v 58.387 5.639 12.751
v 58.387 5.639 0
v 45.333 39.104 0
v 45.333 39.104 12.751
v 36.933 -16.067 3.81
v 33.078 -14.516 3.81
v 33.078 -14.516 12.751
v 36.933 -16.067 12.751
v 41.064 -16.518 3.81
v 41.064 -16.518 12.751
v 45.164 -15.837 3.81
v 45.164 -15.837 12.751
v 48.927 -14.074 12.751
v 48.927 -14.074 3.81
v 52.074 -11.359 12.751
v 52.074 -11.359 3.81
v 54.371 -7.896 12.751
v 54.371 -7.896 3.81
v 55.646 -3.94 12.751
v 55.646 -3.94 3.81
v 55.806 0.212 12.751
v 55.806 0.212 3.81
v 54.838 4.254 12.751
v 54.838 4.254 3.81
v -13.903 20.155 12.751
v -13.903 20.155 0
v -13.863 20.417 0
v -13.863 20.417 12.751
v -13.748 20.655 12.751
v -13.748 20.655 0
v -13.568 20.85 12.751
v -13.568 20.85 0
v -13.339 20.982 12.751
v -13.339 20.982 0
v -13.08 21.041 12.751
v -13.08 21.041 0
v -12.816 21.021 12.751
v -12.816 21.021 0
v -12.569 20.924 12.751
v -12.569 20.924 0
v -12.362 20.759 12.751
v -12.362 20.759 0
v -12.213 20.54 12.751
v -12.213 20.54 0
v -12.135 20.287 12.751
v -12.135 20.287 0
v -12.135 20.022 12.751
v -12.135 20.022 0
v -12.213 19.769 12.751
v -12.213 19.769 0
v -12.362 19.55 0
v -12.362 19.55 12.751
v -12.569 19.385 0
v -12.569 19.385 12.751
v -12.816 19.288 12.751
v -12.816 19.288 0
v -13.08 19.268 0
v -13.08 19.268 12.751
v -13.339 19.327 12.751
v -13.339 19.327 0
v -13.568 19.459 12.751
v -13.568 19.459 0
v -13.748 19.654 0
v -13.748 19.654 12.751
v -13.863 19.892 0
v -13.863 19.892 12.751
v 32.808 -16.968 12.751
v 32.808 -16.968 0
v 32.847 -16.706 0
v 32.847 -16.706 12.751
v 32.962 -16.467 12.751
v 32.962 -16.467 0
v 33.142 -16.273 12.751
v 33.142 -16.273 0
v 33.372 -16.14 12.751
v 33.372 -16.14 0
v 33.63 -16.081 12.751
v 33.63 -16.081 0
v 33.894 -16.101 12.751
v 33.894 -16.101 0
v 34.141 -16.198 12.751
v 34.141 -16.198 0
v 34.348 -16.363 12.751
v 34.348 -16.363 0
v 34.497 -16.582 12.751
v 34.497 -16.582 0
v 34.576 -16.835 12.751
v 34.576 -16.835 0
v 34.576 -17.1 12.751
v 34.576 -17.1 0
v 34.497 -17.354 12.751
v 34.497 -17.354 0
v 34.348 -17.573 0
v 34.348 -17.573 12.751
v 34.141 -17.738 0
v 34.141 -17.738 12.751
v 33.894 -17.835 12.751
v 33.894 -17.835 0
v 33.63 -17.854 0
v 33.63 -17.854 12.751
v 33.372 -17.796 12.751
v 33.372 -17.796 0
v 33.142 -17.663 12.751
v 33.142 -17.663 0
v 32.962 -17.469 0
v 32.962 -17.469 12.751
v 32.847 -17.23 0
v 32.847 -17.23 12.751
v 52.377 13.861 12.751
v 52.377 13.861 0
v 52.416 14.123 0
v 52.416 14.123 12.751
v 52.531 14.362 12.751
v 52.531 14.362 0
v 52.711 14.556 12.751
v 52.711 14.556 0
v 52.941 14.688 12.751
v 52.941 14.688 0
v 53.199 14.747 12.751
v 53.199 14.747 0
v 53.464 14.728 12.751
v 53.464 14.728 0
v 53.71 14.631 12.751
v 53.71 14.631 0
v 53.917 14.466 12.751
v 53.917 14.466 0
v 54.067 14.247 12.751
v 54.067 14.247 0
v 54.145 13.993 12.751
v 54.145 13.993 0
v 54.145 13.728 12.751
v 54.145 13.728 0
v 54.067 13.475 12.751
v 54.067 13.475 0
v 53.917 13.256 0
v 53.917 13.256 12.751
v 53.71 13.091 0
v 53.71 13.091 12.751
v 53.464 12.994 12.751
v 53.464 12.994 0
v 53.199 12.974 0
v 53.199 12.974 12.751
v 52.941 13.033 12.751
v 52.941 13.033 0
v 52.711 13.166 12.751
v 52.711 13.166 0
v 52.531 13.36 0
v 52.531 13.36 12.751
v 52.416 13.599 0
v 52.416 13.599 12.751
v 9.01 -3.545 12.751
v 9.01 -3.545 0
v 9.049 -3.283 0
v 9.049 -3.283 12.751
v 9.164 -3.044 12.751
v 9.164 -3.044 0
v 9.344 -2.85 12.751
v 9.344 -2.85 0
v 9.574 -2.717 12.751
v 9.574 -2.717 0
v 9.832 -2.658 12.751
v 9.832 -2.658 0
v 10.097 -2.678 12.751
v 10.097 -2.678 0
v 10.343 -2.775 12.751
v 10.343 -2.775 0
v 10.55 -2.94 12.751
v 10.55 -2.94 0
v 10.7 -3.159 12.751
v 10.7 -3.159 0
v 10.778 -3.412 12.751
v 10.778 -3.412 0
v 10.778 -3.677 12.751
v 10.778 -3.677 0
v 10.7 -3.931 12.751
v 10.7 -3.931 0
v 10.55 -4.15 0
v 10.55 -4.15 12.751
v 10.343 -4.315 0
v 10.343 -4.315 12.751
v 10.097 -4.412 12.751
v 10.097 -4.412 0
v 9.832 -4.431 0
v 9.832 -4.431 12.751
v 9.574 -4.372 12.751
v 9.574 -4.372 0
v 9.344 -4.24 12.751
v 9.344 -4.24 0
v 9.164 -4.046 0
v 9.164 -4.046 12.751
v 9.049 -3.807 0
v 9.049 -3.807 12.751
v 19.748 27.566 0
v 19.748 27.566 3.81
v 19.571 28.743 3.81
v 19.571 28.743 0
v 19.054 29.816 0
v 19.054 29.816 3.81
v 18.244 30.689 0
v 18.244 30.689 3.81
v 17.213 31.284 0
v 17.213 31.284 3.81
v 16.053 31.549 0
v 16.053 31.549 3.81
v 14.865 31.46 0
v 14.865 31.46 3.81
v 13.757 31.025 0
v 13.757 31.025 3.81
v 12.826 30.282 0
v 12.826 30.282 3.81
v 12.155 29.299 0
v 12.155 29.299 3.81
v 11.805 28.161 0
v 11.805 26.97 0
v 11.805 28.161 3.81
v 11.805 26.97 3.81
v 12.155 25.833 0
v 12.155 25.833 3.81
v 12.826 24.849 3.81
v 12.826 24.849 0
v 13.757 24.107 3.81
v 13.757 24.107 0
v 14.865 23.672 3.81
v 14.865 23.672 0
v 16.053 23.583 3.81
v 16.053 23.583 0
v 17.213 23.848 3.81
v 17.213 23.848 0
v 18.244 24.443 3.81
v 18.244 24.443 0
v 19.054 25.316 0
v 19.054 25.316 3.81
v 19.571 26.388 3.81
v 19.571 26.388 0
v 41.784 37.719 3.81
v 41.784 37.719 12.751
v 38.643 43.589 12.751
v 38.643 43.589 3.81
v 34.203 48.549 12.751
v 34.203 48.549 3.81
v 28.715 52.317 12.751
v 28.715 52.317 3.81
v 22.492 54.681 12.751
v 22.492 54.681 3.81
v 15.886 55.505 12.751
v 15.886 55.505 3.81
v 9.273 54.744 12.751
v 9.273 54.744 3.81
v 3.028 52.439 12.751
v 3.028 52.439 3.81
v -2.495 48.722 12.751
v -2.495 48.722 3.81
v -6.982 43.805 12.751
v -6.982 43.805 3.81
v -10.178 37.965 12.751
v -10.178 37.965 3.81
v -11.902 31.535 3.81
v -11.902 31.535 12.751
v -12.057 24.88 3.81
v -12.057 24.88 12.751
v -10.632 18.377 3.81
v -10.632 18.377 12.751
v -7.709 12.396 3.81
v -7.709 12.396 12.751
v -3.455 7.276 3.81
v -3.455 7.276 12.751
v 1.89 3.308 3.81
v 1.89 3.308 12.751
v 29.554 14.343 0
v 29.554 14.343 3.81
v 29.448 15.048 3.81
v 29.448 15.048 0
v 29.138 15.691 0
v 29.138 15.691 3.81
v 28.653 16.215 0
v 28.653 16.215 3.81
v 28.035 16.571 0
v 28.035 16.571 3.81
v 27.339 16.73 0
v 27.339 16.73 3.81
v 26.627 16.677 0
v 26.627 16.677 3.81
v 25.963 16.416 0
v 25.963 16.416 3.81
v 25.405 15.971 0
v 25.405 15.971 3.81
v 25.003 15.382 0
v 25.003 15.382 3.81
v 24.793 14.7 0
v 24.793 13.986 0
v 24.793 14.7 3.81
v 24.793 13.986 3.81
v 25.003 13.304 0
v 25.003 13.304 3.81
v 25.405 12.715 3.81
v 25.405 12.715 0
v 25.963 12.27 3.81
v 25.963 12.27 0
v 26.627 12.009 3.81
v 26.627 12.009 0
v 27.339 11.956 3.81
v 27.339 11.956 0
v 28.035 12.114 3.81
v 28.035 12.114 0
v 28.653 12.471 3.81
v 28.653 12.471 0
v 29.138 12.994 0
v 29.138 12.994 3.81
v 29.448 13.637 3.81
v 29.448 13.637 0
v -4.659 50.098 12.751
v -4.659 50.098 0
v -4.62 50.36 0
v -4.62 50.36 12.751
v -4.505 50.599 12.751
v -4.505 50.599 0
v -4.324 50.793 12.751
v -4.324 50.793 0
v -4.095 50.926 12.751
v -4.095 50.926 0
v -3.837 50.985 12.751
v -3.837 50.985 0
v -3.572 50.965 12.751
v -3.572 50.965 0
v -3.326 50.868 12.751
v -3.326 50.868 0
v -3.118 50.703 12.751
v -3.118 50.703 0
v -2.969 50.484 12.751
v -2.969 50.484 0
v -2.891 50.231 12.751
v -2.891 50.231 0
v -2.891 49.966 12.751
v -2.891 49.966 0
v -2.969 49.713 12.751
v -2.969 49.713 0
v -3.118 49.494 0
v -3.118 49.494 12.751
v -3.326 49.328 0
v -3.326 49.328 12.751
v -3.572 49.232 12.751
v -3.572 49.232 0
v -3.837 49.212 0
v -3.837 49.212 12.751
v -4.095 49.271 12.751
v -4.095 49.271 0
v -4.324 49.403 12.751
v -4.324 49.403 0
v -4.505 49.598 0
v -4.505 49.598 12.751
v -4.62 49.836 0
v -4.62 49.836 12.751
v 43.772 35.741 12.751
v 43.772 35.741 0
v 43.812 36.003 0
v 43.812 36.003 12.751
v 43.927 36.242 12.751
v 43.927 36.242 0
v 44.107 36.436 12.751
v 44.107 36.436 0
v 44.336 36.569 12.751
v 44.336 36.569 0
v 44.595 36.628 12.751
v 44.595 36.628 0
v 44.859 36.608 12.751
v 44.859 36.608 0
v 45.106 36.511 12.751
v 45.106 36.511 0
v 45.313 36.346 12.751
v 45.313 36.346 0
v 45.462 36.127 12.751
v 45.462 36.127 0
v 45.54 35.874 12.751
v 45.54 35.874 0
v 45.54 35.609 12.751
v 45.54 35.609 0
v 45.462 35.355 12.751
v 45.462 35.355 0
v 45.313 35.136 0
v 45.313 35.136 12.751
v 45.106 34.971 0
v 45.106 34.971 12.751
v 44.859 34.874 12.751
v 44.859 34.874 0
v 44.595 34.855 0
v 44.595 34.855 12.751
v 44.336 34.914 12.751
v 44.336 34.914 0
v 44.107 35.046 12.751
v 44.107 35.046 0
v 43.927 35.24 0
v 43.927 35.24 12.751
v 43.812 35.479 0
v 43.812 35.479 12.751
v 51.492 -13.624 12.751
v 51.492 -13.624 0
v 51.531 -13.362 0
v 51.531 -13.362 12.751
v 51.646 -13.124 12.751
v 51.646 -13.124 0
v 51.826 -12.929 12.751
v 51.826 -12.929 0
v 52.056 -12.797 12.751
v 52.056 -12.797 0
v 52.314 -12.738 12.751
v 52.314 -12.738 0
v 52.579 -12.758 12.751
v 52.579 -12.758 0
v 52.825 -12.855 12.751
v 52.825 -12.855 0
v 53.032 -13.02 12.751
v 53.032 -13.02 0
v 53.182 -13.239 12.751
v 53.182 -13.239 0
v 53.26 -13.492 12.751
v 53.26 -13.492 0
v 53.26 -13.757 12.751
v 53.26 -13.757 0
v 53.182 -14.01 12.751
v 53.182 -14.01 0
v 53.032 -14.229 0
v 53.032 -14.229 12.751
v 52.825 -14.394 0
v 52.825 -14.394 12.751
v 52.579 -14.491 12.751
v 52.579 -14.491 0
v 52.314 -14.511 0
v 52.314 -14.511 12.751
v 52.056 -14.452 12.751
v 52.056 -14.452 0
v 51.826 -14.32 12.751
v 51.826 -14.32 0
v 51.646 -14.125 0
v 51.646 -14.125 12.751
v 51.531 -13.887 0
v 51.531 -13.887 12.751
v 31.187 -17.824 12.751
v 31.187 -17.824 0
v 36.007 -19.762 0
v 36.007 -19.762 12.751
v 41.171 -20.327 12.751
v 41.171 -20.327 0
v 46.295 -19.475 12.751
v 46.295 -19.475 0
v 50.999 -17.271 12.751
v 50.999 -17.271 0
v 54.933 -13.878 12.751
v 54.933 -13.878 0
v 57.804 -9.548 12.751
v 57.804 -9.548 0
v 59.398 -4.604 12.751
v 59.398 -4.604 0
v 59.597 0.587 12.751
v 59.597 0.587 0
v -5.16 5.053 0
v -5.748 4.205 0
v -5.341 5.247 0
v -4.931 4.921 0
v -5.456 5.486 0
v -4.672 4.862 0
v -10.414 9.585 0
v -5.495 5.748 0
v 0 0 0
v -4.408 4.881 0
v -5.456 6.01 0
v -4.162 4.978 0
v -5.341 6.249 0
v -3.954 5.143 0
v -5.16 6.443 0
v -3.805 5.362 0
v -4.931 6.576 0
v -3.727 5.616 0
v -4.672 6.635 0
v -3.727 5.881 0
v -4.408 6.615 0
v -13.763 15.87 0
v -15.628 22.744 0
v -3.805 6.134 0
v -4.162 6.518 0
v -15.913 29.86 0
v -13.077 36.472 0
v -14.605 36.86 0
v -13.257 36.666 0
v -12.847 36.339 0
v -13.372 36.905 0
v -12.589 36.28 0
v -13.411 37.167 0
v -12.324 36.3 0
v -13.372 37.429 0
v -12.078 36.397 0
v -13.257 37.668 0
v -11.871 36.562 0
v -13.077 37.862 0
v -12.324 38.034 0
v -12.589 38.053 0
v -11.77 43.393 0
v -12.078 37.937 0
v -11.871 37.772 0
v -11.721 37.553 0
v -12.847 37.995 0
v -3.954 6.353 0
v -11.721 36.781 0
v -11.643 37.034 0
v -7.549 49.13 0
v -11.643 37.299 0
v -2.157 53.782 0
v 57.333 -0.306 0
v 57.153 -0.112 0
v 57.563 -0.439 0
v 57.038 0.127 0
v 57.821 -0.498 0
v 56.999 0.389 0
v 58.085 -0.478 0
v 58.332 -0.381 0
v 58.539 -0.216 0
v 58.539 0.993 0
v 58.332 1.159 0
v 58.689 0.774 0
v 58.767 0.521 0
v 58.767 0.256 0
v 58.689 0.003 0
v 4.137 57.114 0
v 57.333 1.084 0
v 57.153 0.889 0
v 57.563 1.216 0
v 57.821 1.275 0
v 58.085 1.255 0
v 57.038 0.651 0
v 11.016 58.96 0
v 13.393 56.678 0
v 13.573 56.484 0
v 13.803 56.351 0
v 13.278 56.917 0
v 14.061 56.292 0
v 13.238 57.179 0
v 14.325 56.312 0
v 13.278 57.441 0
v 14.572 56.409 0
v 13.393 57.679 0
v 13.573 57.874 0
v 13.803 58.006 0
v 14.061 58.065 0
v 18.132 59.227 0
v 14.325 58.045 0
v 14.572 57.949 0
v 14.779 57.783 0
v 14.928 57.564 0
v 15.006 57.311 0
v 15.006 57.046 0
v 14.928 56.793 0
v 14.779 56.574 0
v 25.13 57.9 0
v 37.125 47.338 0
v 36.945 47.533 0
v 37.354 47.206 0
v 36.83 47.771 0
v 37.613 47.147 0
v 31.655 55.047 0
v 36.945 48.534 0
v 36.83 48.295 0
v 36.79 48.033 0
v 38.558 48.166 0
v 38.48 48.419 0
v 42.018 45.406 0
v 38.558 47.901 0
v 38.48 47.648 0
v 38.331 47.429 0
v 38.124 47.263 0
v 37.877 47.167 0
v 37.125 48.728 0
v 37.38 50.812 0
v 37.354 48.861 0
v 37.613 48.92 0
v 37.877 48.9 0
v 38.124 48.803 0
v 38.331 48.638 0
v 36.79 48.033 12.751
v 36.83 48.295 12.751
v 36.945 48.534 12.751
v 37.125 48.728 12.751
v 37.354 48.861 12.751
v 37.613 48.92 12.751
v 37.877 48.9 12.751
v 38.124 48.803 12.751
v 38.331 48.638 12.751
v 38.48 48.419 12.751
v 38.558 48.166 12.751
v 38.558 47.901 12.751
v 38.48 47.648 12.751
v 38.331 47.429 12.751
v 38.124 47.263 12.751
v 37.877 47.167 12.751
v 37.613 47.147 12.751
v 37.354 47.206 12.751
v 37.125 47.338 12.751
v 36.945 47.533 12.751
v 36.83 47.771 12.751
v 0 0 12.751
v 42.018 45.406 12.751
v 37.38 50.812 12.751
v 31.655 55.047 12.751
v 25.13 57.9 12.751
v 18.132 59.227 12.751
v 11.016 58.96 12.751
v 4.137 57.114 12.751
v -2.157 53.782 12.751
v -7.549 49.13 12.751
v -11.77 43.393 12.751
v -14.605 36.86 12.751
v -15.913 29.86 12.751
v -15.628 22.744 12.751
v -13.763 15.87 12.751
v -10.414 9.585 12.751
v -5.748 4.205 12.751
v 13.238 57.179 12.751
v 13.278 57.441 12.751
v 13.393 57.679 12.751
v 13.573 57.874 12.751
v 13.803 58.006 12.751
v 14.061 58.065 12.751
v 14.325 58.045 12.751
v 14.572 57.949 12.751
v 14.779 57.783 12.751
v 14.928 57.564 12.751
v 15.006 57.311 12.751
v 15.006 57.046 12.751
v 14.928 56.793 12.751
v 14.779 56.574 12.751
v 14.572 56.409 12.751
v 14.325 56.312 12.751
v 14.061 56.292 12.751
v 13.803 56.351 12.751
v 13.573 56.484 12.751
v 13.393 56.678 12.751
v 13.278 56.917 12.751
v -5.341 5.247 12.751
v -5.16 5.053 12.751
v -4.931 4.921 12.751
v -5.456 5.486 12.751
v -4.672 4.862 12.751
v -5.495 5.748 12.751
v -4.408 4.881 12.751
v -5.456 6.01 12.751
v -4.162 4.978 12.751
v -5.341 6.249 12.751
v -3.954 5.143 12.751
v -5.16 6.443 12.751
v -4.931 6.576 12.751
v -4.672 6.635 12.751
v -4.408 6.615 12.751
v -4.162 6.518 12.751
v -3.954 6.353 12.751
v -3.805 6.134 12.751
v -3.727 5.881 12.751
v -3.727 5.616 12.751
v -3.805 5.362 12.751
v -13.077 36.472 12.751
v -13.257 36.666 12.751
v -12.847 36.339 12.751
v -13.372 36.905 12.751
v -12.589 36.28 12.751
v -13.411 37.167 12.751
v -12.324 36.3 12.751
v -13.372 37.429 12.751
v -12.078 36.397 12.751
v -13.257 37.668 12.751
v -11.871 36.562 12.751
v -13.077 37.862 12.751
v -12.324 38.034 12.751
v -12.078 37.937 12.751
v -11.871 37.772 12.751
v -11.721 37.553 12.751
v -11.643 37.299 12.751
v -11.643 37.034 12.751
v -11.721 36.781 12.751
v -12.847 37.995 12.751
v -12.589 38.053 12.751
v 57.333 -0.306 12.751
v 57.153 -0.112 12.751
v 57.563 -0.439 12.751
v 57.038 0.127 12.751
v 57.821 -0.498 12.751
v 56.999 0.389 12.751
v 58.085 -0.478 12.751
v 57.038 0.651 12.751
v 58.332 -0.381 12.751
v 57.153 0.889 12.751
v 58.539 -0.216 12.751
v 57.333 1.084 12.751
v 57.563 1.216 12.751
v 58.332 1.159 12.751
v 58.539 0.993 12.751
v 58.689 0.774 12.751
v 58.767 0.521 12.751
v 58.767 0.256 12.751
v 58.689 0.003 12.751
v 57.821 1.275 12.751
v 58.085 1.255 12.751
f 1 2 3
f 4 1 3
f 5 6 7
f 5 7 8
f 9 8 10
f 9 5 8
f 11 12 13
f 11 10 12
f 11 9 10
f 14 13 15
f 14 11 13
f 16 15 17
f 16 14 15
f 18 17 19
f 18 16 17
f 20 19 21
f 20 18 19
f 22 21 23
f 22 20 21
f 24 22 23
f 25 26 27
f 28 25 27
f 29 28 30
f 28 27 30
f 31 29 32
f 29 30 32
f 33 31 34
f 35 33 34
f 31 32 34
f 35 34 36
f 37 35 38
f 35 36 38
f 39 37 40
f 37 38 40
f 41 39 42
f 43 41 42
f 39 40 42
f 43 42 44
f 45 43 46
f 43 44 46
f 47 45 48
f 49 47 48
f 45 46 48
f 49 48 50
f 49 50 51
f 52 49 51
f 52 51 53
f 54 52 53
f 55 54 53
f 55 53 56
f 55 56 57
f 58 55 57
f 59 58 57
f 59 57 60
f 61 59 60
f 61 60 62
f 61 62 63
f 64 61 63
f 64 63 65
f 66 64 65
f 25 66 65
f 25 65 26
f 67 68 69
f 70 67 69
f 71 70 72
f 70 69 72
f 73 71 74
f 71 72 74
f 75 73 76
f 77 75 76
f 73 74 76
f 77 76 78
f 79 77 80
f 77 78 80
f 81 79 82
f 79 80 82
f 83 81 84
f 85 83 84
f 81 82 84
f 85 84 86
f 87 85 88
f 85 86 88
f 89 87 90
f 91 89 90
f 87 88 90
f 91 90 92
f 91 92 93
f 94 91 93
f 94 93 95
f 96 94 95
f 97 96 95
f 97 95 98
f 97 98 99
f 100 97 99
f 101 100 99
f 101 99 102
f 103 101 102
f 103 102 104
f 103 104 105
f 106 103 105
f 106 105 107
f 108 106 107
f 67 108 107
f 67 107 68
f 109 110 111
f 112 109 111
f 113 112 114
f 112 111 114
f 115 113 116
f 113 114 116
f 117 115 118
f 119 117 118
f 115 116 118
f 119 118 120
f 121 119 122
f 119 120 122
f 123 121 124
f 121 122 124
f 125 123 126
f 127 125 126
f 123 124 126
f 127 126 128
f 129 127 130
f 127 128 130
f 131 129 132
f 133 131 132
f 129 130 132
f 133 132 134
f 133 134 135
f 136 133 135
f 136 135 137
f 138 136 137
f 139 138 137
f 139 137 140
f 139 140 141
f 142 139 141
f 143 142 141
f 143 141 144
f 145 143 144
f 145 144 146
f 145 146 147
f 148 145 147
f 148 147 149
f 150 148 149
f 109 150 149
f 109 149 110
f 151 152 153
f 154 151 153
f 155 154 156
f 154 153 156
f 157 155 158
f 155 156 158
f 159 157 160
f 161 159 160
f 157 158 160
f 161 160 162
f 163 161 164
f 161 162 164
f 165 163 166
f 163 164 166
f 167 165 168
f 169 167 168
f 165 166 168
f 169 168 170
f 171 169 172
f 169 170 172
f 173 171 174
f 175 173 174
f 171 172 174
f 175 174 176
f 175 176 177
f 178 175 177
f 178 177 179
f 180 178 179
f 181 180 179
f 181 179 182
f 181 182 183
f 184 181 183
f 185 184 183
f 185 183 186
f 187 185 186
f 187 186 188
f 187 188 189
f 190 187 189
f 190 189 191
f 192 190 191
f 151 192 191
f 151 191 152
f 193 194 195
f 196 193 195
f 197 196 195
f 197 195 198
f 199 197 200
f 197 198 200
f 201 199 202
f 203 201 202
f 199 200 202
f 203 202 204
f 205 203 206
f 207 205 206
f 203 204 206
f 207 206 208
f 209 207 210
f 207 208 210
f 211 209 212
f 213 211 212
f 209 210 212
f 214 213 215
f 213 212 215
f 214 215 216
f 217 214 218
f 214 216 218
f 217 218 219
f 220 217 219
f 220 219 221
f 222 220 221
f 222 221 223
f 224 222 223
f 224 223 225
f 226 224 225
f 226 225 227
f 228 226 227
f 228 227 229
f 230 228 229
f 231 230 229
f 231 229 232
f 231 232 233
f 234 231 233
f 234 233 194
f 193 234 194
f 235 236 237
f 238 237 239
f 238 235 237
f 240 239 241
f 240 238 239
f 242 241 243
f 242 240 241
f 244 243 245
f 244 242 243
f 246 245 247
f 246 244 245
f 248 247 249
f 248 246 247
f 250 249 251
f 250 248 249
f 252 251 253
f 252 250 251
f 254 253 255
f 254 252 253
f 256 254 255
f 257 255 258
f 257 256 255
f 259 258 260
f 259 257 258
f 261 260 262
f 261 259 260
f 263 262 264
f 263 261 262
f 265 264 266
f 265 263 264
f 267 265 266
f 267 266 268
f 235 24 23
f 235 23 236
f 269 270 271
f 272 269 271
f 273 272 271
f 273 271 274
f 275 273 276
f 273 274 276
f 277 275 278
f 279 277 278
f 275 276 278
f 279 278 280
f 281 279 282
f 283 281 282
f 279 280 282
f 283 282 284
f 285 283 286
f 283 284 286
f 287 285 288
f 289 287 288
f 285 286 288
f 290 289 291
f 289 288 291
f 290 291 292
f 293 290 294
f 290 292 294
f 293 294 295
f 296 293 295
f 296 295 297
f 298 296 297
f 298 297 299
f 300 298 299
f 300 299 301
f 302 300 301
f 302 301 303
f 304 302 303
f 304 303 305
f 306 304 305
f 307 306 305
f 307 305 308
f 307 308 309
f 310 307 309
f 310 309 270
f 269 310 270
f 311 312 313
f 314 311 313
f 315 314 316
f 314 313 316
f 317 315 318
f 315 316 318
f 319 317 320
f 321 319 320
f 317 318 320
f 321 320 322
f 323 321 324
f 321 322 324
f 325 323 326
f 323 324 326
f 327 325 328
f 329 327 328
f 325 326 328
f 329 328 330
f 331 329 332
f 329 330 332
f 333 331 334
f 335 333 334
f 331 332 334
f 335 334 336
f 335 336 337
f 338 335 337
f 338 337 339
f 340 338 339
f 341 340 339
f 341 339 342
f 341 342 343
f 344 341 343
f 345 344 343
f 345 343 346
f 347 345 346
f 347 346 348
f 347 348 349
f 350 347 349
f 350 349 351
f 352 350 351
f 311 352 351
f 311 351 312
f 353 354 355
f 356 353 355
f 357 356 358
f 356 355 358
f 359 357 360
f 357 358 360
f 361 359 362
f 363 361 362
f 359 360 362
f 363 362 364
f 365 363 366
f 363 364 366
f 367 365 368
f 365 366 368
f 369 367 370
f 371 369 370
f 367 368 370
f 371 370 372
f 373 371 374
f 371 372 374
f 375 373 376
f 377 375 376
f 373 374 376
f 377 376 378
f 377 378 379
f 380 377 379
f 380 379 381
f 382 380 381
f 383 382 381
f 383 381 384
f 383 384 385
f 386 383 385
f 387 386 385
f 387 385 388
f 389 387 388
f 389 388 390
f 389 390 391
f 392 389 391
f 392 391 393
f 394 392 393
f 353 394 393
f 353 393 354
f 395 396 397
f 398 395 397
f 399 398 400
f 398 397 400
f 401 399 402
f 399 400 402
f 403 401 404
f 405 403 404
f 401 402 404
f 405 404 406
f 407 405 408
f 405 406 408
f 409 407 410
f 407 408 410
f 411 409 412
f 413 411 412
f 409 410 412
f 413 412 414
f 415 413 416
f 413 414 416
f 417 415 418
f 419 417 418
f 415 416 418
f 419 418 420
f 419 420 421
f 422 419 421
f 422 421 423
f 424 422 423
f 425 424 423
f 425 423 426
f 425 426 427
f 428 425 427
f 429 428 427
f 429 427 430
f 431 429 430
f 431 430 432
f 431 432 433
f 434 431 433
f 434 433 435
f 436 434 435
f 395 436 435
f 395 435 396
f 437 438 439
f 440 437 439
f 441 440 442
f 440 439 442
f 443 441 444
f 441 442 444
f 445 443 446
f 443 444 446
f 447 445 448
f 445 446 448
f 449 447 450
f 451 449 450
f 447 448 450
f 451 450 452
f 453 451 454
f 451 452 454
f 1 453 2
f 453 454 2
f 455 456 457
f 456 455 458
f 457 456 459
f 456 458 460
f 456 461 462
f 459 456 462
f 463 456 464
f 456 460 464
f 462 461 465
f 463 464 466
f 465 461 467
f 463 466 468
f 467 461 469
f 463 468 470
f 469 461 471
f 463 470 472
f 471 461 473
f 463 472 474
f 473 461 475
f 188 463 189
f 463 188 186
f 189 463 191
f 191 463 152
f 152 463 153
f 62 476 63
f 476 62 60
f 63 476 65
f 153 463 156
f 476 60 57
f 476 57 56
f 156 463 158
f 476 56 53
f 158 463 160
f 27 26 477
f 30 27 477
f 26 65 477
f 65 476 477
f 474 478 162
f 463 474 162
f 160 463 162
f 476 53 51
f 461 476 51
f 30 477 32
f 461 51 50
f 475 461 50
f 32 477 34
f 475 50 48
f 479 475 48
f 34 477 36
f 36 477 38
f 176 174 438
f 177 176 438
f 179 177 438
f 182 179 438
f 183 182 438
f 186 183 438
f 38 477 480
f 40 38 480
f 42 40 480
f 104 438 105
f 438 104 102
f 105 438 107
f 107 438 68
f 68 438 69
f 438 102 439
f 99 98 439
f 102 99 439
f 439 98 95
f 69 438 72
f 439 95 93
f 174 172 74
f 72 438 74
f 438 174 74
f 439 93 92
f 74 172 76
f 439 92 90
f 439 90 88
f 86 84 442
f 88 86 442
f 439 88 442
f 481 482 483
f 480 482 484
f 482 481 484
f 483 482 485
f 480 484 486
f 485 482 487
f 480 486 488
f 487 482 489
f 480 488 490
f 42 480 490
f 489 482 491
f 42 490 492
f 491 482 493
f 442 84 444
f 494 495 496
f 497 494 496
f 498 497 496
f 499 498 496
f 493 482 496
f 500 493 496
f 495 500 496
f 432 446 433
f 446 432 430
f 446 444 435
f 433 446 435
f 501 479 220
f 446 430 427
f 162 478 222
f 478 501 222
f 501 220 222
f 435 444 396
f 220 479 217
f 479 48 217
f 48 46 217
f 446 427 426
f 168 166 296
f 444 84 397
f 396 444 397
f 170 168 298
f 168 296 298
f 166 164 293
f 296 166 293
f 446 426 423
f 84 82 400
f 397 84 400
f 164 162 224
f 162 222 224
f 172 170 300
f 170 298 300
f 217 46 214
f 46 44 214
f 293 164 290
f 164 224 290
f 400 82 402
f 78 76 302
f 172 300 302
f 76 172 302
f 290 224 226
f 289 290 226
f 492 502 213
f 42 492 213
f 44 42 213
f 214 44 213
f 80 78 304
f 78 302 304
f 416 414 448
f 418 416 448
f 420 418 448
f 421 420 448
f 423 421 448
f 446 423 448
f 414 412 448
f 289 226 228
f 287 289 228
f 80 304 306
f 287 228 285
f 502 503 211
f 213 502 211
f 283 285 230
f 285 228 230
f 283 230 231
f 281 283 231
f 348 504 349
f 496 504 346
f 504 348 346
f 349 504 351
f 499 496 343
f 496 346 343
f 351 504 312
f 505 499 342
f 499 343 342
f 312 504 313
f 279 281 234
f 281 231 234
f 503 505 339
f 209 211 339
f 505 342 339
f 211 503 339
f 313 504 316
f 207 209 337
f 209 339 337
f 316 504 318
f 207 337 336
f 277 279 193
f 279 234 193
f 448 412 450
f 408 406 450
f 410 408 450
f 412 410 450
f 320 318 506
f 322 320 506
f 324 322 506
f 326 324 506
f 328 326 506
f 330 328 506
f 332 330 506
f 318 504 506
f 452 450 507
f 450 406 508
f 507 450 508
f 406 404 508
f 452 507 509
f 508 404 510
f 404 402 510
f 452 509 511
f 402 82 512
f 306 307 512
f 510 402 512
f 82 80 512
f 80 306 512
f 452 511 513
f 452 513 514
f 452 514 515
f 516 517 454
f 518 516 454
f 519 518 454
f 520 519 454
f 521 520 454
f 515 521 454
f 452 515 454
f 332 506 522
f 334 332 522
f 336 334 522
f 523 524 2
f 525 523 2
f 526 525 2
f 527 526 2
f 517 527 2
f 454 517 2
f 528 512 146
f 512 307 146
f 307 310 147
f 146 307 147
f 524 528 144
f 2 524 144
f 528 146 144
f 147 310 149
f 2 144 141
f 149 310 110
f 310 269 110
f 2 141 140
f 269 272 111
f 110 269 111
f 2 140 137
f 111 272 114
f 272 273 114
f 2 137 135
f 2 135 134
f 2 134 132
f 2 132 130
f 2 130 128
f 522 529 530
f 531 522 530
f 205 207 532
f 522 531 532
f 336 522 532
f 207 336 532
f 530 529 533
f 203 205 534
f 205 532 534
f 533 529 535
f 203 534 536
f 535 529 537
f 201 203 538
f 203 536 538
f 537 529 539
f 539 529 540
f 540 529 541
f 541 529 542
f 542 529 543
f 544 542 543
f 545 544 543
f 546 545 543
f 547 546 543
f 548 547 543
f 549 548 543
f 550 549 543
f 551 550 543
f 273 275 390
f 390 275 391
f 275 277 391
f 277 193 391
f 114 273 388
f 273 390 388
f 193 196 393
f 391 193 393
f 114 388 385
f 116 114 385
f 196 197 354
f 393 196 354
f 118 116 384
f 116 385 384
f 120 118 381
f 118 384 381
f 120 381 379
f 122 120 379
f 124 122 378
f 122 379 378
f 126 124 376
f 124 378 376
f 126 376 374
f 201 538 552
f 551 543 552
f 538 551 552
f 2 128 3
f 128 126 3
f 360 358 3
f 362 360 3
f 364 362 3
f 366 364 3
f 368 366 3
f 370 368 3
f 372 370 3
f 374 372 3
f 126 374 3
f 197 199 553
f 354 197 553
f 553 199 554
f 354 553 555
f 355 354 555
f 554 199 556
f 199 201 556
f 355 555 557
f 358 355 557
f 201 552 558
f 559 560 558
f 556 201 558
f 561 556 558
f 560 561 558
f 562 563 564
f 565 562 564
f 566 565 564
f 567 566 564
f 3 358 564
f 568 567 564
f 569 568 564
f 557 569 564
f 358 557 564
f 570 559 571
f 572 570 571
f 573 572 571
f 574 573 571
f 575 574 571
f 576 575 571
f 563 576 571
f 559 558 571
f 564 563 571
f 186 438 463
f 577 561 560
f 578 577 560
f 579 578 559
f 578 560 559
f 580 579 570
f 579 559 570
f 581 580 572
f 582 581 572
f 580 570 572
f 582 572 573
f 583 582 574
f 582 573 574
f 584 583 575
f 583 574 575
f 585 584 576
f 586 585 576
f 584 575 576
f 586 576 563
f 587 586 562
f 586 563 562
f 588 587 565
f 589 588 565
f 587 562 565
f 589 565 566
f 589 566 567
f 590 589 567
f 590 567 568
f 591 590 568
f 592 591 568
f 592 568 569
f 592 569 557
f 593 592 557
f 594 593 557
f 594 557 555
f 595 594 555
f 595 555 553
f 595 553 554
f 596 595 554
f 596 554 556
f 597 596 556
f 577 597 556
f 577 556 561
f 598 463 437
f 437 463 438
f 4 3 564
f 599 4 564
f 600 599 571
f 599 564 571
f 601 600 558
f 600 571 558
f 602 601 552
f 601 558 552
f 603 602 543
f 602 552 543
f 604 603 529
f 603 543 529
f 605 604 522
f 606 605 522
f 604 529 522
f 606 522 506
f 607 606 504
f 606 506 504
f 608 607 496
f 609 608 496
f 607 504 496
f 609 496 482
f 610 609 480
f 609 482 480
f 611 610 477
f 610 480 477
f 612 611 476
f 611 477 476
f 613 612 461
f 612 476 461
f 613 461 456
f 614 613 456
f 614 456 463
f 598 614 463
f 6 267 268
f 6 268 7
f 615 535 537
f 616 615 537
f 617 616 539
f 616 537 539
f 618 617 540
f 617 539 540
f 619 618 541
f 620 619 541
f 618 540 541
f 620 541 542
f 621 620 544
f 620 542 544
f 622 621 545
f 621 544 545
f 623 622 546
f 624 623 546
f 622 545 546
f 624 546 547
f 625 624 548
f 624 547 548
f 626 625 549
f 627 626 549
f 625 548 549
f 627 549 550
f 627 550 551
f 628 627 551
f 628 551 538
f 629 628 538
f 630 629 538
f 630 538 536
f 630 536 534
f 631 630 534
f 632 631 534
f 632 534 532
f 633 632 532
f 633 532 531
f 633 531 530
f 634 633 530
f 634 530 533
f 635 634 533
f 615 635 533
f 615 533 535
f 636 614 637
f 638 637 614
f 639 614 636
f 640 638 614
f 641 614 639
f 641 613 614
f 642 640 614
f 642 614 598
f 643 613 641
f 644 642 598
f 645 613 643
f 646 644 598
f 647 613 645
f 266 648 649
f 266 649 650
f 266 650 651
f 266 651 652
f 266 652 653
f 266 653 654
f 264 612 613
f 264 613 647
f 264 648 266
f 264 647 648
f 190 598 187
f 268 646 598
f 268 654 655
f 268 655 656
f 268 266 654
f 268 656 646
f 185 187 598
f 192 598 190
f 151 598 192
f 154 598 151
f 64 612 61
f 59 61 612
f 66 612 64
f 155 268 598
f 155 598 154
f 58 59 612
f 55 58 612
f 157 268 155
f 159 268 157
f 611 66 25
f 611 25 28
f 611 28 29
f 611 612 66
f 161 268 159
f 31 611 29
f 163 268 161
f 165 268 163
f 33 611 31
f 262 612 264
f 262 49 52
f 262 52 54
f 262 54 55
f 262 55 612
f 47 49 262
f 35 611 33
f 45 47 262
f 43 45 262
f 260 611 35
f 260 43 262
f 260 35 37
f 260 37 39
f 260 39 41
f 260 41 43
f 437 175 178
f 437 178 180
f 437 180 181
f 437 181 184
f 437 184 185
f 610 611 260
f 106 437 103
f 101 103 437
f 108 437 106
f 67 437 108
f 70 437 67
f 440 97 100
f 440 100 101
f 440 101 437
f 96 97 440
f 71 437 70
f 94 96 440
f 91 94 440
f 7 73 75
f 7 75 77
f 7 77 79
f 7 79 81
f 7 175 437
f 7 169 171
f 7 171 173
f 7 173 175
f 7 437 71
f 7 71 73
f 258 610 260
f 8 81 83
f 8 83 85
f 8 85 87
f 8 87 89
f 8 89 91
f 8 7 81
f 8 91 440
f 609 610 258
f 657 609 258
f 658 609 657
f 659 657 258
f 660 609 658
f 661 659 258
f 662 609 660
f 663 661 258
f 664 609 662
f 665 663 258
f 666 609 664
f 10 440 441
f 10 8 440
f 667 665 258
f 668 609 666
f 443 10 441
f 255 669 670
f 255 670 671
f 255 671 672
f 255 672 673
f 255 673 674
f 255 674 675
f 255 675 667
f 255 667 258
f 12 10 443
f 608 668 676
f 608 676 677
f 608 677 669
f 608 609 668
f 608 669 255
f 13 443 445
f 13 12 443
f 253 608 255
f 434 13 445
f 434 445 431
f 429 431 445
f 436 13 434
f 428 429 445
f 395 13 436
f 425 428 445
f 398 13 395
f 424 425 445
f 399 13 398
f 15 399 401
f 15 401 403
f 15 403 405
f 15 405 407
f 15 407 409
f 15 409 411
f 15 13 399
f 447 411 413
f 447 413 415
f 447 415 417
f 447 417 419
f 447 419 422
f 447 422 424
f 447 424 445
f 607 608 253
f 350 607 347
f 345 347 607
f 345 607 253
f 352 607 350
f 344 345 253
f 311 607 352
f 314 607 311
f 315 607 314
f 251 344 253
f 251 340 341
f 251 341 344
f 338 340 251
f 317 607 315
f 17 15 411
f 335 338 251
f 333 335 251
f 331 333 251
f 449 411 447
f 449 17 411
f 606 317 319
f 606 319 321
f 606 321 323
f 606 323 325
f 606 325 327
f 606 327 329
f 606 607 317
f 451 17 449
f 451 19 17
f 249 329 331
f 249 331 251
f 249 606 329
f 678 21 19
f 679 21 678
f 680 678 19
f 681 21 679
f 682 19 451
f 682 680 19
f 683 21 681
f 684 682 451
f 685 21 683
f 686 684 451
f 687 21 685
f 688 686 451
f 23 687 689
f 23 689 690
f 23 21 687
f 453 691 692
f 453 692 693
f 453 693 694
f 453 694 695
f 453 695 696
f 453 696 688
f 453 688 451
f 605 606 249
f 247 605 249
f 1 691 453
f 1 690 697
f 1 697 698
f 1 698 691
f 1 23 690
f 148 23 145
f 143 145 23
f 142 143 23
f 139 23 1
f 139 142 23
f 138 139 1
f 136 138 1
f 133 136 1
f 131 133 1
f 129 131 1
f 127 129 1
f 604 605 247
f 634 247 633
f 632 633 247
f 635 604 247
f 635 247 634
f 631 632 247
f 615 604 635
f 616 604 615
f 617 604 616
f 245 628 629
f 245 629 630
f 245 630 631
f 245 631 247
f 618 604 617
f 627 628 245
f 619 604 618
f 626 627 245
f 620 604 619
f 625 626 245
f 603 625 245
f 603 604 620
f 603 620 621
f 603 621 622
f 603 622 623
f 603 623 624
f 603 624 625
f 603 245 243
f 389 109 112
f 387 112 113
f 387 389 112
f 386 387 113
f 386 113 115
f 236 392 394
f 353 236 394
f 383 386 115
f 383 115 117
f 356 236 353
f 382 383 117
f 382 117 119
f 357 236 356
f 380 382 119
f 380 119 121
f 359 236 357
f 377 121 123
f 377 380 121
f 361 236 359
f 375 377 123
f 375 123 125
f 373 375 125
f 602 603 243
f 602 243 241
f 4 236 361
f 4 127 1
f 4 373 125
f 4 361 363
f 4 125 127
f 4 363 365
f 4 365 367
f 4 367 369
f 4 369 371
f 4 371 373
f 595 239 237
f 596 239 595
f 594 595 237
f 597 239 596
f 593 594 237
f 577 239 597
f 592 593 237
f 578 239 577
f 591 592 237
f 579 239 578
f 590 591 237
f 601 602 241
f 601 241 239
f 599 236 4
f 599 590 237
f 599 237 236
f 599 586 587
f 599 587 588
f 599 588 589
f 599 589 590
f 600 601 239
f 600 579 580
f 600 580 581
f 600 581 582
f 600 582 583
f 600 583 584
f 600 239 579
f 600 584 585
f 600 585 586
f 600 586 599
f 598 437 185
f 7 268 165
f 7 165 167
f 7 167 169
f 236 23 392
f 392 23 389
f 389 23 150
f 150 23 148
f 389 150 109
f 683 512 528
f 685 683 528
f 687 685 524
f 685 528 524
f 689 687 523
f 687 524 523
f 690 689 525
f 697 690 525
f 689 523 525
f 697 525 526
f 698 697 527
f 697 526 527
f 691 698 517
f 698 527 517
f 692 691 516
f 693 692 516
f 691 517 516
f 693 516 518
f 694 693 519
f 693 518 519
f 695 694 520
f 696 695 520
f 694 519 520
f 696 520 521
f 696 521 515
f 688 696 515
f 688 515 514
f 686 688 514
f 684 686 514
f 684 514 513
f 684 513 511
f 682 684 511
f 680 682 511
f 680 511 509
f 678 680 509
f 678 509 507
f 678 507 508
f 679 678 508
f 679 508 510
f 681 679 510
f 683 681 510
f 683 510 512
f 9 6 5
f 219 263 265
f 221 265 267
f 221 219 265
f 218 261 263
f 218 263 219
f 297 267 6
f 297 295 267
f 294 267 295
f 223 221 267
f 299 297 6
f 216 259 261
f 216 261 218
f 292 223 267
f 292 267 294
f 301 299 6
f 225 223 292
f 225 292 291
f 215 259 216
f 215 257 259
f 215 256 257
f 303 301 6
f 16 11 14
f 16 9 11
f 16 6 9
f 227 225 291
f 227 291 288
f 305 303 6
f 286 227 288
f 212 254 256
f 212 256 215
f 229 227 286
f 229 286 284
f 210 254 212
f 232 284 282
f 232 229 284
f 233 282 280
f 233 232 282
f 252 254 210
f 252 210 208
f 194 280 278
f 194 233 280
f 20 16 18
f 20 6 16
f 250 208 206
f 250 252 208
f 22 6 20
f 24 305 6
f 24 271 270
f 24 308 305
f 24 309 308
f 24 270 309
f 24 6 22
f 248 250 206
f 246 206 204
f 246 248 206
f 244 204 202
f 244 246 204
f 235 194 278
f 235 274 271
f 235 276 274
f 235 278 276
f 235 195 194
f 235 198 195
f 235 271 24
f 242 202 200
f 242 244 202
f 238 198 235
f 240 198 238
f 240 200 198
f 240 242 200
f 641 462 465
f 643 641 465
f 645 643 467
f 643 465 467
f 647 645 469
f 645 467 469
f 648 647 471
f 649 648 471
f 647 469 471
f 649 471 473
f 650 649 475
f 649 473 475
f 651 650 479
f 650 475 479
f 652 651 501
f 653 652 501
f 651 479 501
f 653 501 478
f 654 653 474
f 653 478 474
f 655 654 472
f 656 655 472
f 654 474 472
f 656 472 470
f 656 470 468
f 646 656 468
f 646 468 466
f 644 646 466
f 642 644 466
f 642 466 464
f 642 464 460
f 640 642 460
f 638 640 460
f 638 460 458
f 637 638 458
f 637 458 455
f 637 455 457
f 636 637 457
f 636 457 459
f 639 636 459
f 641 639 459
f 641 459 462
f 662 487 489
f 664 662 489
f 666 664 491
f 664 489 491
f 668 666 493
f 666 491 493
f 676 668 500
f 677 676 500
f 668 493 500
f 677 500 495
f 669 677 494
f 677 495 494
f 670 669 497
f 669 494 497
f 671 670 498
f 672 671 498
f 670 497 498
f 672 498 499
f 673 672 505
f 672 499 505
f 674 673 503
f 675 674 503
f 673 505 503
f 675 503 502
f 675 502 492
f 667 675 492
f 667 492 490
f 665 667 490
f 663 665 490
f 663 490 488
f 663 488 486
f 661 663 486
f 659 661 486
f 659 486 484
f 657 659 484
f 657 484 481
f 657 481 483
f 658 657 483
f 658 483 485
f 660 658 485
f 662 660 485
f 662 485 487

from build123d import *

# Parameters (mm, degrees)
BOSS_EXTRUDE1_DEPTH        = 12.7508
SHELL2_T                   = -3.81
F_50_0_07_DIAMETER_HOLE3_D = 1.778
SKETCH15_R                 = 3.99415
CUT_EXTRUDE2_DEPTH         = 85.623521635
SKETCH16_R                 = 2.39395
CUT_EXTRUDE3_DEPTH         = 85.623521635


with BuildPart() as part:
    # Sketch1 → Boss-Extrude1 (new body)
    with BuildSketch(Plane.XY):
        with BuildLine():
            Line((0, 0), (31.187102024, -17.823710818))
            ThreePointArc((31.187102024, -17.823710818), (53.082286429, -15.709260563), (58.387158413, 5.638534012))
            Line((58.387158413, 5.638534012), (45.333427314, 39.103741383))
            ThreePointArc((45.333427314, 39.103741383), (-4.983807045, 51.60744456), (0, 0))
        make_face()
    extrude(amount=BOSS_EXTRUDE1_DEPTH)

    # Shell2
    shell2_openings = [part.faces().sort_by_distance(p)[0] for p in [
        (22.133833563, 20.169644853, 12.7508),
    ]]
    offset(amount=SHELL2_T, openings=shell2_openings, kind=Kind.INTERSECTION)

    # #50 (0.07) Diameter Hole3 (through all)
    with Locations(Plane.XY.offset(12.7508)):
        with Locations((-3.770169746, 50.098384989), (14.127303317, 57.178704003), (37.679197815, 48.033291943), (57.887608334, 0.388645245), (52.380693545, -13.624486137), (33.69651837, -16.967970116), (9.898779461, -3.544865319), (-4.606040741, 5.748053387), (-13.01391957, 20.154535826), (-12.52223075, 37.166969012), (44.661179065, 35.741071433), (53.265733422, 13.860918924)):
            Hole(F_50_0_07_DIAMETER_HOLE3_D / 2)

    # Sketch15 → Cut-Extrude2 (cut, through all)
    with BuildSketch(Plane.XY.offset(3.81)):
        with Locations((15.754083482, 27.565764159)):
            Circle(SKETCH15_R)
    extrude(amount=-CUT_EXTRUDE2_DEPTH, mode=Mode.SUBTRACT)

    # Sketch16 → Cut-Extrude3 (cut, through all)
    with BuildSketch(Plane.XY.offset(3.81)):
        with Locations((27.159923271, 14.342839938)):
            Circle(SKETCH16_R)
    extrude(amount=-CUT_EXTRUDE3_DEPTH, mode=Mode.SUBTRACT)


solid = part.part
